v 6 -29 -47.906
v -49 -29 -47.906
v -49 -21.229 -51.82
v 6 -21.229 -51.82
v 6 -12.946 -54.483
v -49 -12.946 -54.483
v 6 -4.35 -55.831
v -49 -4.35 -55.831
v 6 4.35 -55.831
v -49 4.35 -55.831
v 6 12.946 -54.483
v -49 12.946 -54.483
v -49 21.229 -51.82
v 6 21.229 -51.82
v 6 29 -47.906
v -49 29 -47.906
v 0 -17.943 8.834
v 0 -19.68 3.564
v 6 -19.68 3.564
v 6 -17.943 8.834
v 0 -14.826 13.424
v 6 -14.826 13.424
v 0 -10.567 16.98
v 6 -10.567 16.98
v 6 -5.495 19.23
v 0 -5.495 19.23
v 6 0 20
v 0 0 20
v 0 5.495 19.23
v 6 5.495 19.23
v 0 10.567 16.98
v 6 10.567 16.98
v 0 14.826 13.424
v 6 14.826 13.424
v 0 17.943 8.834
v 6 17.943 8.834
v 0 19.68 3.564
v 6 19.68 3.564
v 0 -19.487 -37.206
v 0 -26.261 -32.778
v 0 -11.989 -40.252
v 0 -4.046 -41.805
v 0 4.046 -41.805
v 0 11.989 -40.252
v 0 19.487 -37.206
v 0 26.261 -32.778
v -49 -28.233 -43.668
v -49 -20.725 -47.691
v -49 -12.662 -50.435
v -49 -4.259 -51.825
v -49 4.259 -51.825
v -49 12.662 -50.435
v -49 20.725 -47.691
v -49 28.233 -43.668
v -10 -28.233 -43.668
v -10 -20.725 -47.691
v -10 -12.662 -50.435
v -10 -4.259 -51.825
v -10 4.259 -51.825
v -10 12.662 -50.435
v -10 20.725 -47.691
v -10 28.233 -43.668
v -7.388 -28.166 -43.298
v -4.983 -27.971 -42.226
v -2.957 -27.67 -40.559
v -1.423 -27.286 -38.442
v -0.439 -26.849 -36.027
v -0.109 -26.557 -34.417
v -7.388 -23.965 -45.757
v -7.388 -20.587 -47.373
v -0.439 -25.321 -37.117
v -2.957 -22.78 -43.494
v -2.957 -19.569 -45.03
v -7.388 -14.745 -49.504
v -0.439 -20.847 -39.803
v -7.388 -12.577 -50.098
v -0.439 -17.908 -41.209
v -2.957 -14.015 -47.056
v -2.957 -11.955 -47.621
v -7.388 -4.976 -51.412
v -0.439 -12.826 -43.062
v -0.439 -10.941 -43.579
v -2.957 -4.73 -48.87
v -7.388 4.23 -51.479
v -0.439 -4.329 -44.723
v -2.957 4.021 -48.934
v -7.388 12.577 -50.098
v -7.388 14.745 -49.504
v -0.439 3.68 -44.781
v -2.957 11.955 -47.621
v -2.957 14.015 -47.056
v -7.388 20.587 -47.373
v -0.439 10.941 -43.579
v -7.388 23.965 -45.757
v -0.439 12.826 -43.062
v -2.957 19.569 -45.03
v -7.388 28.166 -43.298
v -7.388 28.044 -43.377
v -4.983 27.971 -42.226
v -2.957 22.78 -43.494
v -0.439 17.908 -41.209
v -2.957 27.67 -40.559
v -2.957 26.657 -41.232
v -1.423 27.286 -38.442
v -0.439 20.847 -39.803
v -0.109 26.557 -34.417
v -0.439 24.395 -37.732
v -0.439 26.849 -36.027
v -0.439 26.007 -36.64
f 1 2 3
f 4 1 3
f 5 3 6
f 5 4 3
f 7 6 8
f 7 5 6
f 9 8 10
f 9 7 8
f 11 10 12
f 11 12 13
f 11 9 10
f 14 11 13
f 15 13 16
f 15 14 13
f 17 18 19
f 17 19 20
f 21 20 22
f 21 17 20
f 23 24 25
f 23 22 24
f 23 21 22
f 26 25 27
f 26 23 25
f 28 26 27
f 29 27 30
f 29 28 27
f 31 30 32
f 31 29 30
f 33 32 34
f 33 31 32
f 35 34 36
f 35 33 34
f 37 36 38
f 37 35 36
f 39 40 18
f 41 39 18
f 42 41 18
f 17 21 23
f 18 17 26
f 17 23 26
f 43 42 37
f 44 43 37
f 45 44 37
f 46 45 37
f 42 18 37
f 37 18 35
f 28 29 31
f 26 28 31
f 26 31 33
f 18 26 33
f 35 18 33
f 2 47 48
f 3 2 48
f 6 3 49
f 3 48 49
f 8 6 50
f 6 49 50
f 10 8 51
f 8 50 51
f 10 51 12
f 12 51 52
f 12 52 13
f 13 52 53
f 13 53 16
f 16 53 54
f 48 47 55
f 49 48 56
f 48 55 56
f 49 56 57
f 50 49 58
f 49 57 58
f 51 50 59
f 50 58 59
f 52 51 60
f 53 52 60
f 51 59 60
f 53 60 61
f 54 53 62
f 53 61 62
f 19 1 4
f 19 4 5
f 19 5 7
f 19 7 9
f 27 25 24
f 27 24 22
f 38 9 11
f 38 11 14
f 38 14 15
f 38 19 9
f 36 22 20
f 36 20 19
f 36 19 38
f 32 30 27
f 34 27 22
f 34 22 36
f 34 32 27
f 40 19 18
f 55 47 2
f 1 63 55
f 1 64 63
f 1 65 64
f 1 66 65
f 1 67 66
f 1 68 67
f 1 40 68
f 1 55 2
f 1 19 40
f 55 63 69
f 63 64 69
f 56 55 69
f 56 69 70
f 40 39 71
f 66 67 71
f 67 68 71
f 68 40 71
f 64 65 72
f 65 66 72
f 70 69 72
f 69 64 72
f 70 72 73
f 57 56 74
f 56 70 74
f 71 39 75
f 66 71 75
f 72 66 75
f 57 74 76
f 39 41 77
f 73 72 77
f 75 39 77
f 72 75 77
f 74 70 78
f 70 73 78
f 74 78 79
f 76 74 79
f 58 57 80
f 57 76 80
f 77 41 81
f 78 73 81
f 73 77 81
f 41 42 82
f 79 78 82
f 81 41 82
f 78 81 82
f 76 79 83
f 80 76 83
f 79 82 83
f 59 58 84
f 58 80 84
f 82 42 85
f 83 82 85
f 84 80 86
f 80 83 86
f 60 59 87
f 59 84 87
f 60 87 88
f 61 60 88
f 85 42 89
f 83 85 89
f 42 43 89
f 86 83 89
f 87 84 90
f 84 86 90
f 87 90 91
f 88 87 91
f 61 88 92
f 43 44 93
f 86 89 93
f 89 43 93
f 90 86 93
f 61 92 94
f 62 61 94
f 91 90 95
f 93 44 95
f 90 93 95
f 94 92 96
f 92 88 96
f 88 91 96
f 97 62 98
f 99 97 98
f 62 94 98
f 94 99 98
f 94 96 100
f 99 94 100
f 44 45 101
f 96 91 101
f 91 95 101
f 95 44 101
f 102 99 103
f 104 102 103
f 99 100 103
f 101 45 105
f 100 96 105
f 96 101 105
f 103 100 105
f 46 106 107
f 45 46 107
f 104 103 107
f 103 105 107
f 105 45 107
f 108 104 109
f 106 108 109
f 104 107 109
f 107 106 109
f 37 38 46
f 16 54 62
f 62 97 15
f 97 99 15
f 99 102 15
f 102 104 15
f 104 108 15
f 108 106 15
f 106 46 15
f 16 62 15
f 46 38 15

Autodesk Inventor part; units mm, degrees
ref_plane "YZ Plane" through (0, 0, 0) normal (1, 0, 0) x (0, 1, 0)
ref_plane "XZ Plane" through (0, 0, 0) normal (0, 1, 0) x (-1, 0, 0)
ref_plane "XY Plane" through (0, 0, 0) normal (0, 0, 1) x (1, 0, 0)
sketch "Sketch1" plane through (0, 0, 0) normal (1, 0, 0) x (0, 1, 0)
  circle A0 centre (0, 0) radius 20
  line L0 (-19.68, 3.5636) -> (-29, -47.9062)
  line L1 (19.68, 3.5636) -> (29, -47.9062)
  line L2 (11.5, 0) -> (-11.5, 0) construction
  line L3 (0, -48.5721) -> (0, 48.5721) construction
  arc A1 (-28.2326, -43.6683) -> (28.2326, -43.6683) centre (0, 0) ccw
  arc A2 (-29, -47.9062) -> (29, -47.9062) centre (0, 0) ccw
  point P0 (0, -56)
  point P1 (0, 0)
  dimension "d0" = 40
  dimension "d8" = 104
  dimension "d9" = 112
  dimension "d10" = 58
extrude "Extrusion1" add sketch "Sketch1" along normal blind 6
extrude "Extrusion2" add sketch "Sketch1" against normal blind 49 contours L1 A2 L0 A1
fillet "Fillet1" radius 10 1 edges at (0, 0, -52)
properties part number "thigh_connector"
